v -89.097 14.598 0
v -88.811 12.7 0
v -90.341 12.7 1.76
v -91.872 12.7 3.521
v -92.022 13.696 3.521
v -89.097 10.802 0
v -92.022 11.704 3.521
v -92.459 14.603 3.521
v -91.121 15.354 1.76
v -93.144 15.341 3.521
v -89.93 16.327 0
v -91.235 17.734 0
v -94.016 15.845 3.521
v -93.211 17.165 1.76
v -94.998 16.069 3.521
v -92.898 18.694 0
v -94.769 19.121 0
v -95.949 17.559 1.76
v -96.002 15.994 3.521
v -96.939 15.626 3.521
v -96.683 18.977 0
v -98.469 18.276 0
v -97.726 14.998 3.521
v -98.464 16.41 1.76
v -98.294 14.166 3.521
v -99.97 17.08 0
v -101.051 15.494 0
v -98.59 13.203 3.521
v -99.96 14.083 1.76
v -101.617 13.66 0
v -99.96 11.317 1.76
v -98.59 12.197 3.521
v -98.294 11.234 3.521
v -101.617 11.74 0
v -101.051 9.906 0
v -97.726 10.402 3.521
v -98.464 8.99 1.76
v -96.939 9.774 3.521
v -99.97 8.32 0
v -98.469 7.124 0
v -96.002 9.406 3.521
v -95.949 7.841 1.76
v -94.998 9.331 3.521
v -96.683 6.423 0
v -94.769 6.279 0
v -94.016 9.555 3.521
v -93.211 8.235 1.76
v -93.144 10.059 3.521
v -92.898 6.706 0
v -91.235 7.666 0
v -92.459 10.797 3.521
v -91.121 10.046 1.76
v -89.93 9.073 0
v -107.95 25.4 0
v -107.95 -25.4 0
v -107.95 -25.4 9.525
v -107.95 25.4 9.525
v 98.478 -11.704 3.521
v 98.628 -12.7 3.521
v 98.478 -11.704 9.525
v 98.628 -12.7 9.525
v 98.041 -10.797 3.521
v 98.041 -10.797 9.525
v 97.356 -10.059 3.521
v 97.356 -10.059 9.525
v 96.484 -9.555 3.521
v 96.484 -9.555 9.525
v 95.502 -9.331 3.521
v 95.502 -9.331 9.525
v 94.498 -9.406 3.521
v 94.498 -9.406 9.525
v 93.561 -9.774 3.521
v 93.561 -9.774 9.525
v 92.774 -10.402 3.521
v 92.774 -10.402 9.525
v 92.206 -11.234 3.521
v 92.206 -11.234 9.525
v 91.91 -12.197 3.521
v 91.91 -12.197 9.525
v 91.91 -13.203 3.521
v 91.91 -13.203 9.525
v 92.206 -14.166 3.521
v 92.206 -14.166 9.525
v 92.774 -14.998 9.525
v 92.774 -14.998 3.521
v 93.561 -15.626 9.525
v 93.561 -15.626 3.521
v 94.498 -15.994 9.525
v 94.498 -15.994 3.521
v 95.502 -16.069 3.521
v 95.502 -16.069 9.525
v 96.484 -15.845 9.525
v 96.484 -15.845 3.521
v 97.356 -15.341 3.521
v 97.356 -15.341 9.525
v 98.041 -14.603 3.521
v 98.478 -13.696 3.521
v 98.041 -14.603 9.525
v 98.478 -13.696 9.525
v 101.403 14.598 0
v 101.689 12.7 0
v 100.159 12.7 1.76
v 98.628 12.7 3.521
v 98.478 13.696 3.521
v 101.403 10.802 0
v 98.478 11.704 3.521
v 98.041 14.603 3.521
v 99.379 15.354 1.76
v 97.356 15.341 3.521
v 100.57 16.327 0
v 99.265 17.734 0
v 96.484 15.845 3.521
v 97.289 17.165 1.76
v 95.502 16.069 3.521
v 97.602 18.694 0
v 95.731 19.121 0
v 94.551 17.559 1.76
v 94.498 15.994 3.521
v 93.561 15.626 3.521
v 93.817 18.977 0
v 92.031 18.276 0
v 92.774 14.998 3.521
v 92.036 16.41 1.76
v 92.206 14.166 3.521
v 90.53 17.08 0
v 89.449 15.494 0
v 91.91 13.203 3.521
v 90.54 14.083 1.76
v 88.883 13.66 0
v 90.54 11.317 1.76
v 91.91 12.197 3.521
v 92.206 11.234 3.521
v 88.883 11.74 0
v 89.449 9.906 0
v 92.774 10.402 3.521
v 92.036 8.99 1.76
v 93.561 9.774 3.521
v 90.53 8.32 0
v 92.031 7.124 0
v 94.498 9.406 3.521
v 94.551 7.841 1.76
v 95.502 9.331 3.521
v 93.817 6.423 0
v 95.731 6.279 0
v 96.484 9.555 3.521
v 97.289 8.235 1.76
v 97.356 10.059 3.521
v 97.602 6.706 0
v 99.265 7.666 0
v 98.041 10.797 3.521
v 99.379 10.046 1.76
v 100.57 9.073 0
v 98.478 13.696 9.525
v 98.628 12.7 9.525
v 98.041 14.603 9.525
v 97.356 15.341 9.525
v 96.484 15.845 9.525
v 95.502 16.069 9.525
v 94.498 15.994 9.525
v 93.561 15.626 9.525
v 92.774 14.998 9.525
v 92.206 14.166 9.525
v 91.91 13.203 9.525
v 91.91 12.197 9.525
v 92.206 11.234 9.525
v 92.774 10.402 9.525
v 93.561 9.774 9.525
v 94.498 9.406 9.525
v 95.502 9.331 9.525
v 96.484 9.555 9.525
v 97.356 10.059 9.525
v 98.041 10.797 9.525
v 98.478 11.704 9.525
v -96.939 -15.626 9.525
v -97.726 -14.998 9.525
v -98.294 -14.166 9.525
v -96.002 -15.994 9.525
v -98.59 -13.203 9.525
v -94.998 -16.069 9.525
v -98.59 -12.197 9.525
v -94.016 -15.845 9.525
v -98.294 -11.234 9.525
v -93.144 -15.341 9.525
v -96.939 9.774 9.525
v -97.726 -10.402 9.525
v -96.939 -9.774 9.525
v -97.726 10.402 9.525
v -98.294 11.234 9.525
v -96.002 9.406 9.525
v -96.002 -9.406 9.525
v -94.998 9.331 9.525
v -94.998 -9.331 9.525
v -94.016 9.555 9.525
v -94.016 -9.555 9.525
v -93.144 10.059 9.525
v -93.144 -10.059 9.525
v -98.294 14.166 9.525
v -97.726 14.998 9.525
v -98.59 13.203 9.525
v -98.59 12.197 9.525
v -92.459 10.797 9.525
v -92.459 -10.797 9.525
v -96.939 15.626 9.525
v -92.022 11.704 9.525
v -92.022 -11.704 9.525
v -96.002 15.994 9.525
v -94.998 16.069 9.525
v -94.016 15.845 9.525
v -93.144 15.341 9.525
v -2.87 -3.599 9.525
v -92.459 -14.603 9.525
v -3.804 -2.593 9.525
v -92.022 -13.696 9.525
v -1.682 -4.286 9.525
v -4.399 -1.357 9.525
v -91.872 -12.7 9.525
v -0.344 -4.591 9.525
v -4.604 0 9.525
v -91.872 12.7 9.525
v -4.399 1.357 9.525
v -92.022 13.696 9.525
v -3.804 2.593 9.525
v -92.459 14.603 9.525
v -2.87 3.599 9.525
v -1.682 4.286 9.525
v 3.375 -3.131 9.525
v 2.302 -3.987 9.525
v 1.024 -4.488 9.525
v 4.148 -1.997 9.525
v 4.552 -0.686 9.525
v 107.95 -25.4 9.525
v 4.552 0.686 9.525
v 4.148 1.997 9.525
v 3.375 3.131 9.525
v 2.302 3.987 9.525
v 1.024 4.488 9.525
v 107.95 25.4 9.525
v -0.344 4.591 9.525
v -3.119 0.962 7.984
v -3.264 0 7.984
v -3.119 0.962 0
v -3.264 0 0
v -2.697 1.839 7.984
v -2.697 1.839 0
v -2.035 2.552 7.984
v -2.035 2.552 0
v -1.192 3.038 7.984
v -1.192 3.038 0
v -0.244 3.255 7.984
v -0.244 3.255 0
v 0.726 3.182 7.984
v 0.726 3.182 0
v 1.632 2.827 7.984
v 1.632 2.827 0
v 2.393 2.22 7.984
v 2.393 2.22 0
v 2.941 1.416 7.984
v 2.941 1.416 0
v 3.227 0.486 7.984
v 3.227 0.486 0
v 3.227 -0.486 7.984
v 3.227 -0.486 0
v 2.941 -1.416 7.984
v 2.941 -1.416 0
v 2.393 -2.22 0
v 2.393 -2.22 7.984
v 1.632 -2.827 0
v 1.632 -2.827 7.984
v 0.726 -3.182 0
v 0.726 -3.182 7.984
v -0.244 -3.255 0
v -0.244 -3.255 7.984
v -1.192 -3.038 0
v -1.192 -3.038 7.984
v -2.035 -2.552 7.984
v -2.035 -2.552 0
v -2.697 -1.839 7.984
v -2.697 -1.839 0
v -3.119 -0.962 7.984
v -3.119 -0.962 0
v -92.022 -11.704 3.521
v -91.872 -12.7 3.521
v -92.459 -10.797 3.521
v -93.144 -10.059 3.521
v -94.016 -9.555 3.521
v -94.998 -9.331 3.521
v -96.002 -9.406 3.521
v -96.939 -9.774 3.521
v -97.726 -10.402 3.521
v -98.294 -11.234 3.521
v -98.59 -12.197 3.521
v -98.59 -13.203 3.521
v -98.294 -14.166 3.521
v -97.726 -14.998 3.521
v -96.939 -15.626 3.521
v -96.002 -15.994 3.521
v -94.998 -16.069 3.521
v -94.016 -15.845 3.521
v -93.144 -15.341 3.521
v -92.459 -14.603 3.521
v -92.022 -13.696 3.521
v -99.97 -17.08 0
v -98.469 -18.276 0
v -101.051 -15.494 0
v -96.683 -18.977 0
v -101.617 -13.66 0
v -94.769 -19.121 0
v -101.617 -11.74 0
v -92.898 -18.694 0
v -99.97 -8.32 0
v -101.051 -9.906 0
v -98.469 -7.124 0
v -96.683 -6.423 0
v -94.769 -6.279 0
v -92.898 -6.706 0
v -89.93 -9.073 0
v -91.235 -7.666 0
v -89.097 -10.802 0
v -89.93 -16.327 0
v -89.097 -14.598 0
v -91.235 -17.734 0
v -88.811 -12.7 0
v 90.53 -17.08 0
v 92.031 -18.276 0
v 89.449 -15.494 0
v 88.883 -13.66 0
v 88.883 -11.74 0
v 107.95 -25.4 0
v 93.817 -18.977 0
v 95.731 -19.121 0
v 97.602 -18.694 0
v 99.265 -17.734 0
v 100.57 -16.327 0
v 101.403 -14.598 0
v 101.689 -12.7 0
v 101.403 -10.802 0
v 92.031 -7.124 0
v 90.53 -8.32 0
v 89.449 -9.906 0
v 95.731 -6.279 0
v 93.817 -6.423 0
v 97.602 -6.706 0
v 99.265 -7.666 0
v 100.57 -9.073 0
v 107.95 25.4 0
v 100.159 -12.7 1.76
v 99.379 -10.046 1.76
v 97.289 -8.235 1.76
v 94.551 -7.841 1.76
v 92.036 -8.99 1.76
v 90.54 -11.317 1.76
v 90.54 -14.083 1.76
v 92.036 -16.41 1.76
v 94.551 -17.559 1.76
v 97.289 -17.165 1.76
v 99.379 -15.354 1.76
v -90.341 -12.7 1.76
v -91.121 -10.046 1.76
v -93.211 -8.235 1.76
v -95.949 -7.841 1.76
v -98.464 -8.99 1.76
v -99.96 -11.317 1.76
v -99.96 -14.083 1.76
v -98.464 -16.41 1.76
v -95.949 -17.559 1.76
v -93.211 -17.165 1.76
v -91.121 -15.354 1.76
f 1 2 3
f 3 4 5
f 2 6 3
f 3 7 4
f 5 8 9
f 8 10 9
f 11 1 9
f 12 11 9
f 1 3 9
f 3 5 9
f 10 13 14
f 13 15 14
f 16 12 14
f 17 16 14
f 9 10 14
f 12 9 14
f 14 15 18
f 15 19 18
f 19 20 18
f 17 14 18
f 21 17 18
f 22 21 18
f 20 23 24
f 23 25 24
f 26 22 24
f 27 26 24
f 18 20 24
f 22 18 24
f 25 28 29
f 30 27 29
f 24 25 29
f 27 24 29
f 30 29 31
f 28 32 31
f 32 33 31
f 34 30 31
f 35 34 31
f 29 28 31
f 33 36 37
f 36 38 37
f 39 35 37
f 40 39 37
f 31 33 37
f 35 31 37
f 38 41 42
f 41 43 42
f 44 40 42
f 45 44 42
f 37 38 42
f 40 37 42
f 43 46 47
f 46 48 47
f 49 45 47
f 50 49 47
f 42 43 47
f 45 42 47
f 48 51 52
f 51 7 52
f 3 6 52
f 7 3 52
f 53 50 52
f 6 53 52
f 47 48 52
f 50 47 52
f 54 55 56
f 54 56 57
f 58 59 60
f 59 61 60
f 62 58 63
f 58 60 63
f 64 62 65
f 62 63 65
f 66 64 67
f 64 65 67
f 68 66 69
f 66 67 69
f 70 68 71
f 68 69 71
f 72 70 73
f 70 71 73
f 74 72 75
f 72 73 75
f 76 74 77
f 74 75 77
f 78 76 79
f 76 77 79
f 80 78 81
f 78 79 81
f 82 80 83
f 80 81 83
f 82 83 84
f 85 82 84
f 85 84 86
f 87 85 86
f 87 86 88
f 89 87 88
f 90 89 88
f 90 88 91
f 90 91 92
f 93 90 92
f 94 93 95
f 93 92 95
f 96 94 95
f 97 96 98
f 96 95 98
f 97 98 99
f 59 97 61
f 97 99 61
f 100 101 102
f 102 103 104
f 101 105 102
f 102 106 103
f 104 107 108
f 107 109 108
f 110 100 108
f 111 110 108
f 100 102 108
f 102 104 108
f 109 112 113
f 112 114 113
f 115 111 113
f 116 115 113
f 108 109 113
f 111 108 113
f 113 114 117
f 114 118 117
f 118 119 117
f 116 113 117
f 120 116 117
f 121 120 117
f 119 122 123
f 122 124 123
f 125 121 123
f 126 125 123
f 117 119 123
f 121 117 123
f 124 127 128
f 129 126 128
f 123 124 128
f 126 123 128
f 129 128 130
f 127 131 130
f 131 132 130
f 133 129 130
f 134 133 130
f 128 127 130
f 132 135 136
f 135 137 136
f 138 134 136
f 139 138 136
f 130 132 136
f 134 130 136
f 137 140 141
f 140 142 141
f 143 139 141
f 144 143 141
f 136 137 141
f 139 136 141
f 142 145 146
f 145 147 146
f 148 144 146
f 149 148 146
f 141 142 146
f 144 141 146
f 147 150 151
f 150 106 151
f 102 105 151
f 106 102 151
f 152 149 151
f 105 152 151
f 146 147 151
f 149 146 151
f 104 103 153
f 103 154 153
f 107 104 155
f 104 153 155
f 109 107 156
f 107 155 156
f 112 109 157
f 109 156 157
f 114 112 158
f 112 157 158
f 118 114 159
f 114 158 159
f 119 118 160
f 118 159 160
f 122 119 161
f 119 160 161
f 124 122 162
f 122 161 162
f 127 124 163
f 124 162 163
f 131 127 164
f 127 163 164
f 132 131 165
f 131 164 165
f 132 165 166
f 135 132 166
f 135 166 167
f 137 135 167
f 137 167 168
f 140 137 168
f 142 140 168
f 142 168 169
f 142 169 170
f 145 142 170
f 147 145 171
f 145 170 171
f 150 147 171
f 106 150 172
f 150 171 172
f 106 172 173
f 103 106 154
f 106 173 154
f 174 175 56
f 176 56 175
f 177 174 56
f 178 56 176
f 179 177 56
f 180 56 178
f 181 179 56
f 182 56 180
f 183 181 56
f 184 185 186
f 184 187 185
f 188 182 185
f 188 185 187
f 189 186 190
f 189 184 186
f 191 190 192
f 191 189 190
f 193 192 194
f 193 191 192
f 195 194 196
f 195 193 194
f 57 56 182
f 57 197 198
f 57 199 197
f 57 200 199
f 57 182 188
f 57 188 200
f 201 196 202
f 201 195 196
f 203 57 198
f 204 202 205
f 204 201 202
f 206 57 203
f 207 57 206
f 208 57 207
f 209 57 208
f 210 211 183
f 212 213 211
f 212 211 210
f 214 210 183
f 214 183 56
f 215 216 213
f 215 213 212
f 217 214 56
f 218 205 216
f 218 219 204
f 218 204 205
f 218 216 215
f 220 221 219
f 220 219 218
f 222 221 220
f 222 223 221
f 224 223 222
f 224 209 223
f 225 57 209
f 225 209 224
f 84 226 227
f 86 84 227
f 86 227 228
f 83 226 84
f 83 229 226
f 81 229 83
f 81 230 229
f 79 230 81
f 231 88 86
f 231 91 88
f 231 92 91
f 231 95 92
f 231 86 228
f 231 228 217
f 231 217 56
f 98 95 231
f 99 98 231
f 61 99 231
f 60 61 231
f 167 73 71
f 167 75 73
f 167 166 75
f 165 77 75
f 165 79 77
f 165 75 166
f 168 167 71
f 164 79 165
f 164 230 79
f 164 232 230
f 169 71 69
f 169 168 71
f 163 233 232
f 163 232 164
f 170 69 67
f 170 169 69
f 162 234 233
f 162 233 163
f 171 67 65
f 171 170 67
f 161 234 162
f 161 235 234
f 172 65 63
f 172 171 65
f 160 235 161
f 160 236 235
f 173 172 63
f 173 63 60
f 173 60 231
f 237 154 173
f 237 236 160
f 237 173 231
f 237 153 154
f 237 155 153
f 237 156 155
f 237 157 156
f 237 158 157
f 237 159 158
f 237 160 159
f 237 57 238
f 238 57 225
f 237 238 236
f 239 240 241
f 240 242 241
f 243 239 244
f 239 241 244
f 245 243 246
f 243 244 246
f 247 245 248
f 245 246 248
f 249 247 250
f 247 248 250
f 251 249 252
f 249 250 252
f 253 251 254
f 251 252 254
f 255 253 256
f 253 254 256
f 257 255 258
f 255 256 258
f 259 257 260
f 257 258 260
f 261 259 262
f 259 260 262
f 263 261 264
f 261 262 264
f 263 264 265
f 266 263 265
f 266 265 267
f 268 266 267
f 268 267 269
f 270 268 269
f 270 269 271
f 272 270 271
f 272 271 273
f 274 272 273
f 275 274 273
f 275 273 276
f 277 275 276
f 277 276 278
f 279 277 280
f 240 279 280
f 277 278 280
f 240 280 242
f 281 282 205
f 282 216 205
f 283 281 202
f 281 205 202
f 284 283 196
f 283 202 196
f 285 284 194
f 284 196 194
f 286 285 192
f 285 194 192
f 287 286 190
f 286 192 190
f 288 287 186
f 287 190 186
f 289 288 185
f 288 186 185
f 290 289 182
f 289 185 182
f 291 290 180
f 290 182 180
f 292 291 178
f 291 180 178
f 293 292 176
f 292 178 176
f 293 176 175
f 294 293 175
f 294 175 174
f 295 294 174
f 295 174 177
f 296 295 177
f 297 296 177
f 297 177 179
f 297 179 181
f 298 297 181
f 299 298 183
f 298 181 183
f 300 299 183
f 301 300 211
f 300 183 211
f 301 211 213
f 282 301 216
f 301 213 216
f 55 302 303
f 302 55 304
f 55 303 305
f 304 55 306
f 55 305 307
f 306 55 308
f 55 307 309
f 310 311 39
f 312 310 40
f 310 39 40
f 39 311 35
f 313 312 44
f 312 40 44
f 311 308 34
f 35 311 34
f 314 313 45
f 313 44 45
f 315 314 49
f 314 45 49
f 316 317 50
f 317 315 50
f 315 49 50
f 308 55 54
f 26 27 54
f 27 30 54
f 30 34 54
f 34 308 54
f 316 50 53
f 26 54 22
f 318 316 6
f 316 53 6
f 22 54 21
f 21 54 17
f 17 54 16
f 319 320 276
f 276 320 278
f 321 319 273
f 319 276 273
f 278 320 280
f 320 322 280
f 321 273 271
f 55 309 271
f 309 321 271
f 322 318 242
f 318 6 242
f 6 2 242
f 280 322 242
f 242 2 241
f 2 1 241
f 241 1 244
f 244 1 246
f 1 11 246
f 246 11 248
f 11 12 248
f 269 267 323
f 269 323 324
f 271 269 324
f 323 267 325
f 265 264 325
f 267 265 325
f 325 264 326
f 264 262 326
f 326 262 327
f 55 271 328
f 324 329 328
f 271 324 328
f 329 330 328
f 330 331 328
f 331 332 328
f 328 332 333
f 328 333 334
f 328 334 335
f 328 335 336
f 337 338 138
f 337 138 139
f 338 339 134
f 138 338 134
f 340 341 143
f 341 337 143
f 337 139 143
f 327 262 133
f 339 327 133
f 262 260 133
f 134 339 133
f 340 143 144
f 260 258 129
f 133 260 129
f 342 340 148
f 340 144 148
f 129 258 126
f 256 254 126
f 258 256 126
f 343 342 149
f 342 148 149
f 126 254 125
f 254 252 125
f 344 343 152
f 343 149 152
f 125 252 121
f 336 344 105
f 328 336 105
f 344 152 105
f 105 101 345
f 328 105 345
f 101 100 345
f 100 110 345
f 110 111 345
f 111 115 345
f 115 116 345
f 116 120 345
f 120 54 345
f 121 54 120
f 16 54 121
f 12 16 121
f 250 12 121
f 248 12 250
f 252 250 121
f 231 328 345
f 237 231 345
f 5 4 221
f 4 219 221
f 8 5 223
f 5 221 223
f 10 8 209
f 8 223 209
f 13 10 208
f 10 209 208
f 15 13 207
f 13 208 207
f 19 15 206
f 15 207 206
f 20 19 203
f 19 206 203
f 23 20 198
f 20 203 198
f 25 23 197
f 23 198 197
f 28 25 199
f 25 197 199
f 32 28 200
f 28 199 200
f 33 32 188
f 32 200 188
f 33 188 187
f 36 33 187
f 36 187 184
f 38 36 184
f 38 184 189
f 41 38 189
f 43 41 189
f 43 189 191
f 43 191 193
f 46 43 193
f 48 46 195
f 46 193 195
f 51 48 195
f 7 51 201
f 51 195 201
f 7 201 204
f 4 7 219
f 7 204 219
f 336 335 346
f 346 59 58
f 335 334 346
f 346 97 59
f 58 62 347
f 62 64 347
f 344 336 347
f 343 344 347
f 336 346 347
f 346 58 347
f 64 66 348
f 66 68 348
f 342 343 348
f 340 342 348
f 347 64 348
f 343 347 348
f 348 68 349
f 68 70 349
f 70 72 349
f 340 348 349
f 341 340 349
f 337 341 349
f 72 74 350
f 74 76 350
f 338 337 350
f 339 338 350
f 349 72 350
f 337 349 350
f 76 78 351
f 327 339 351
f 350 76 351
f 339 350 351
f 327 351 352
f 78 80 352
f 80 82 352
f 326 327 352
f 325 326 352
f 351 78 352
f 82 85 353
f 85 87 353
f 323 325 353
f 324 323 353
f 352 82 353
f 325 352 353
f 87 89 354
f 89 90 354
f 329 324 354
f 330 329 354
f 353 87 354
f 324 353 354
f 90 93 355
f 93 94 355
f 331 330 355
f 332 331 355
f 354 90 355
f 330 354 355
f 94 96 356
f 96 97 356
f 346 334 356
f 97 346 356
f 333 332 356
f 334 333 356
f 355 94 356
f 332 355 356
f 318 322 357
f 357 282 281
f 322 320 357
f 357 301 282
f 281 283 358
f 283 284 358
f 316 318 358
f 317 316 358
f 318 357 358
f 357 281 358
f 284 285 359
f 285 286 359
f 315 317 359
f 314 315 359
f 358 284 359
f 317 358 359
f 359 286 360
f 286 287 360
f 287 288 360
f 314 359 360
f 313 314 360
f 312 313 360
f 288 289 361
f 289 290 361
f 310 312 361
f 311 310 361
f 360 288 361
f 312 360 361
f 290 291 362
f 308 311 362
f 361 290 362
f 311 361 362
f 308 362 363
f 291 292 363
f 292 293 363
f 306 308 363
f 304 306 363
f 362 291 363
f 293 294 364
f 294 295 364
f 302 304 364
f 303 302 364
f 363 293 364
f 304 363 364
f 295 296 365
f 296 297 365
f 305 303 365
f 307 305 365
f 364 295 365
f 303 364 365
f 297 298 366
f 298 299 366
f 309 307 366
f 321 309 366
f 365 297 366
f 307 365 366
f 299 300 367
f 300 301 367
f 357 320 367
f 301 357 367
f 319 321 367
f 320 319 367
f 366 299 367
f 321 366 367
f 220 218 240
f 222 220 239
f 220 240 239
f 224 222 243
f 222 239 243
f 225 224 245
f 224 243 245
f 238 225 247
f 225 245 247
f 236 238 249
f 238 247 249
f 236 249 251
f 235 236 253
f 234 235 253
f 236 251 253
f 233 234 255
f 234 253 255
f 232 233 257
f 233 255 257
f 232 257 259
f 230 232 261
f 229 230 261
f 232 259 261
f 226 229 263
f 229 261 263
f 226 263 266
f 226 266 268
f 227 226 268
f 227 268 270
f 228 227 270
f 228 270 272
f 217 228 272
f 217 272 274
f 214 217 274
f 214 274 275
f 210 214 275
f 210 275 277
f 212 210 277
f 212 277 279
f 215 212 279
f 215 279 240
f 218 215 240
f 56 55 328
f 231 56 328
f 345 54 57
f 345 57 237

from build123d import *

# Parameters (mm, degrees)
SKETCH1_W                                        = 215.9
SKETCH1_H                                        = 50.8
BOSS_EXTRUDE1_DEPTH                              = 9.525
CSK_FOR_1_4_FLAT_HEAD_MACHINE_SCREW1_D           = 6.7564
CSK_FOR_1_4_FLAT_HEAD_MACHINE_SCREW1_CSINK_D     = 12.8778
CSK_FOR_1_4_FLAT_HEAD_MACHINE_SCREW1_CSINK_ANGLE = 82
F_5_16_18_TAPPED_HOLE1_D                         = 6.5278
F_5_16_18_TAPPED_HOLE1_CSINK_D                   = 9.2075
F_5_16_18_TAPPED_HOLE1_CSINK_ANGLE               = 82


with BuildPart() as part:
    # Sketch1 → Boss-Extrude1 (new body)
    with BuildSketch(Plane.XY):
        Rectangle(SKETCH1_W, SKETCH1_H)
    extrude(amount=BOSS_EXTRUDE1_DEPTH)

    # CSK for 1/4 Flat Head Machine Screw1 (through all)
    with Locations(Plane(origin=(0, 0, 0), x_dir=(-1, 0, 0), z_dir=(0, 0, -1))):
        with Locations((-95.25, 12.7), (-95.25, -12.7), (95.25, 12.7), (95.25, -12.7)):
            CounterSinkHole(CSK_FOR_1_4_FLAT_HEAD_MACHINE_SCREW1_D / 2, CSK_FOR_1_4_FLAT_HEAD_MACHINE_SCREW1_CSINK_D / 2, counter_sink_angle=CSK_FOR_1_4_FLAT_HEAD_MACHINE_SCREW1_CSINK_ANGLE)

    # 5/16-18 Tapped Hole1 (through all)
    with Locations(Plane.XY.offset(9.525)):
        with Locations((0, 0)):
            CounterSinkHole(F_5_16_18_TAPPED_HOLE1_D / 2, F_5_16_18_TAPPED_HOLE1_CSINK_D / 2, counter_sink_angle=F_5_16_18_TAPPED_HOLE1_CSINK_ANGLE)


solid = part.part
